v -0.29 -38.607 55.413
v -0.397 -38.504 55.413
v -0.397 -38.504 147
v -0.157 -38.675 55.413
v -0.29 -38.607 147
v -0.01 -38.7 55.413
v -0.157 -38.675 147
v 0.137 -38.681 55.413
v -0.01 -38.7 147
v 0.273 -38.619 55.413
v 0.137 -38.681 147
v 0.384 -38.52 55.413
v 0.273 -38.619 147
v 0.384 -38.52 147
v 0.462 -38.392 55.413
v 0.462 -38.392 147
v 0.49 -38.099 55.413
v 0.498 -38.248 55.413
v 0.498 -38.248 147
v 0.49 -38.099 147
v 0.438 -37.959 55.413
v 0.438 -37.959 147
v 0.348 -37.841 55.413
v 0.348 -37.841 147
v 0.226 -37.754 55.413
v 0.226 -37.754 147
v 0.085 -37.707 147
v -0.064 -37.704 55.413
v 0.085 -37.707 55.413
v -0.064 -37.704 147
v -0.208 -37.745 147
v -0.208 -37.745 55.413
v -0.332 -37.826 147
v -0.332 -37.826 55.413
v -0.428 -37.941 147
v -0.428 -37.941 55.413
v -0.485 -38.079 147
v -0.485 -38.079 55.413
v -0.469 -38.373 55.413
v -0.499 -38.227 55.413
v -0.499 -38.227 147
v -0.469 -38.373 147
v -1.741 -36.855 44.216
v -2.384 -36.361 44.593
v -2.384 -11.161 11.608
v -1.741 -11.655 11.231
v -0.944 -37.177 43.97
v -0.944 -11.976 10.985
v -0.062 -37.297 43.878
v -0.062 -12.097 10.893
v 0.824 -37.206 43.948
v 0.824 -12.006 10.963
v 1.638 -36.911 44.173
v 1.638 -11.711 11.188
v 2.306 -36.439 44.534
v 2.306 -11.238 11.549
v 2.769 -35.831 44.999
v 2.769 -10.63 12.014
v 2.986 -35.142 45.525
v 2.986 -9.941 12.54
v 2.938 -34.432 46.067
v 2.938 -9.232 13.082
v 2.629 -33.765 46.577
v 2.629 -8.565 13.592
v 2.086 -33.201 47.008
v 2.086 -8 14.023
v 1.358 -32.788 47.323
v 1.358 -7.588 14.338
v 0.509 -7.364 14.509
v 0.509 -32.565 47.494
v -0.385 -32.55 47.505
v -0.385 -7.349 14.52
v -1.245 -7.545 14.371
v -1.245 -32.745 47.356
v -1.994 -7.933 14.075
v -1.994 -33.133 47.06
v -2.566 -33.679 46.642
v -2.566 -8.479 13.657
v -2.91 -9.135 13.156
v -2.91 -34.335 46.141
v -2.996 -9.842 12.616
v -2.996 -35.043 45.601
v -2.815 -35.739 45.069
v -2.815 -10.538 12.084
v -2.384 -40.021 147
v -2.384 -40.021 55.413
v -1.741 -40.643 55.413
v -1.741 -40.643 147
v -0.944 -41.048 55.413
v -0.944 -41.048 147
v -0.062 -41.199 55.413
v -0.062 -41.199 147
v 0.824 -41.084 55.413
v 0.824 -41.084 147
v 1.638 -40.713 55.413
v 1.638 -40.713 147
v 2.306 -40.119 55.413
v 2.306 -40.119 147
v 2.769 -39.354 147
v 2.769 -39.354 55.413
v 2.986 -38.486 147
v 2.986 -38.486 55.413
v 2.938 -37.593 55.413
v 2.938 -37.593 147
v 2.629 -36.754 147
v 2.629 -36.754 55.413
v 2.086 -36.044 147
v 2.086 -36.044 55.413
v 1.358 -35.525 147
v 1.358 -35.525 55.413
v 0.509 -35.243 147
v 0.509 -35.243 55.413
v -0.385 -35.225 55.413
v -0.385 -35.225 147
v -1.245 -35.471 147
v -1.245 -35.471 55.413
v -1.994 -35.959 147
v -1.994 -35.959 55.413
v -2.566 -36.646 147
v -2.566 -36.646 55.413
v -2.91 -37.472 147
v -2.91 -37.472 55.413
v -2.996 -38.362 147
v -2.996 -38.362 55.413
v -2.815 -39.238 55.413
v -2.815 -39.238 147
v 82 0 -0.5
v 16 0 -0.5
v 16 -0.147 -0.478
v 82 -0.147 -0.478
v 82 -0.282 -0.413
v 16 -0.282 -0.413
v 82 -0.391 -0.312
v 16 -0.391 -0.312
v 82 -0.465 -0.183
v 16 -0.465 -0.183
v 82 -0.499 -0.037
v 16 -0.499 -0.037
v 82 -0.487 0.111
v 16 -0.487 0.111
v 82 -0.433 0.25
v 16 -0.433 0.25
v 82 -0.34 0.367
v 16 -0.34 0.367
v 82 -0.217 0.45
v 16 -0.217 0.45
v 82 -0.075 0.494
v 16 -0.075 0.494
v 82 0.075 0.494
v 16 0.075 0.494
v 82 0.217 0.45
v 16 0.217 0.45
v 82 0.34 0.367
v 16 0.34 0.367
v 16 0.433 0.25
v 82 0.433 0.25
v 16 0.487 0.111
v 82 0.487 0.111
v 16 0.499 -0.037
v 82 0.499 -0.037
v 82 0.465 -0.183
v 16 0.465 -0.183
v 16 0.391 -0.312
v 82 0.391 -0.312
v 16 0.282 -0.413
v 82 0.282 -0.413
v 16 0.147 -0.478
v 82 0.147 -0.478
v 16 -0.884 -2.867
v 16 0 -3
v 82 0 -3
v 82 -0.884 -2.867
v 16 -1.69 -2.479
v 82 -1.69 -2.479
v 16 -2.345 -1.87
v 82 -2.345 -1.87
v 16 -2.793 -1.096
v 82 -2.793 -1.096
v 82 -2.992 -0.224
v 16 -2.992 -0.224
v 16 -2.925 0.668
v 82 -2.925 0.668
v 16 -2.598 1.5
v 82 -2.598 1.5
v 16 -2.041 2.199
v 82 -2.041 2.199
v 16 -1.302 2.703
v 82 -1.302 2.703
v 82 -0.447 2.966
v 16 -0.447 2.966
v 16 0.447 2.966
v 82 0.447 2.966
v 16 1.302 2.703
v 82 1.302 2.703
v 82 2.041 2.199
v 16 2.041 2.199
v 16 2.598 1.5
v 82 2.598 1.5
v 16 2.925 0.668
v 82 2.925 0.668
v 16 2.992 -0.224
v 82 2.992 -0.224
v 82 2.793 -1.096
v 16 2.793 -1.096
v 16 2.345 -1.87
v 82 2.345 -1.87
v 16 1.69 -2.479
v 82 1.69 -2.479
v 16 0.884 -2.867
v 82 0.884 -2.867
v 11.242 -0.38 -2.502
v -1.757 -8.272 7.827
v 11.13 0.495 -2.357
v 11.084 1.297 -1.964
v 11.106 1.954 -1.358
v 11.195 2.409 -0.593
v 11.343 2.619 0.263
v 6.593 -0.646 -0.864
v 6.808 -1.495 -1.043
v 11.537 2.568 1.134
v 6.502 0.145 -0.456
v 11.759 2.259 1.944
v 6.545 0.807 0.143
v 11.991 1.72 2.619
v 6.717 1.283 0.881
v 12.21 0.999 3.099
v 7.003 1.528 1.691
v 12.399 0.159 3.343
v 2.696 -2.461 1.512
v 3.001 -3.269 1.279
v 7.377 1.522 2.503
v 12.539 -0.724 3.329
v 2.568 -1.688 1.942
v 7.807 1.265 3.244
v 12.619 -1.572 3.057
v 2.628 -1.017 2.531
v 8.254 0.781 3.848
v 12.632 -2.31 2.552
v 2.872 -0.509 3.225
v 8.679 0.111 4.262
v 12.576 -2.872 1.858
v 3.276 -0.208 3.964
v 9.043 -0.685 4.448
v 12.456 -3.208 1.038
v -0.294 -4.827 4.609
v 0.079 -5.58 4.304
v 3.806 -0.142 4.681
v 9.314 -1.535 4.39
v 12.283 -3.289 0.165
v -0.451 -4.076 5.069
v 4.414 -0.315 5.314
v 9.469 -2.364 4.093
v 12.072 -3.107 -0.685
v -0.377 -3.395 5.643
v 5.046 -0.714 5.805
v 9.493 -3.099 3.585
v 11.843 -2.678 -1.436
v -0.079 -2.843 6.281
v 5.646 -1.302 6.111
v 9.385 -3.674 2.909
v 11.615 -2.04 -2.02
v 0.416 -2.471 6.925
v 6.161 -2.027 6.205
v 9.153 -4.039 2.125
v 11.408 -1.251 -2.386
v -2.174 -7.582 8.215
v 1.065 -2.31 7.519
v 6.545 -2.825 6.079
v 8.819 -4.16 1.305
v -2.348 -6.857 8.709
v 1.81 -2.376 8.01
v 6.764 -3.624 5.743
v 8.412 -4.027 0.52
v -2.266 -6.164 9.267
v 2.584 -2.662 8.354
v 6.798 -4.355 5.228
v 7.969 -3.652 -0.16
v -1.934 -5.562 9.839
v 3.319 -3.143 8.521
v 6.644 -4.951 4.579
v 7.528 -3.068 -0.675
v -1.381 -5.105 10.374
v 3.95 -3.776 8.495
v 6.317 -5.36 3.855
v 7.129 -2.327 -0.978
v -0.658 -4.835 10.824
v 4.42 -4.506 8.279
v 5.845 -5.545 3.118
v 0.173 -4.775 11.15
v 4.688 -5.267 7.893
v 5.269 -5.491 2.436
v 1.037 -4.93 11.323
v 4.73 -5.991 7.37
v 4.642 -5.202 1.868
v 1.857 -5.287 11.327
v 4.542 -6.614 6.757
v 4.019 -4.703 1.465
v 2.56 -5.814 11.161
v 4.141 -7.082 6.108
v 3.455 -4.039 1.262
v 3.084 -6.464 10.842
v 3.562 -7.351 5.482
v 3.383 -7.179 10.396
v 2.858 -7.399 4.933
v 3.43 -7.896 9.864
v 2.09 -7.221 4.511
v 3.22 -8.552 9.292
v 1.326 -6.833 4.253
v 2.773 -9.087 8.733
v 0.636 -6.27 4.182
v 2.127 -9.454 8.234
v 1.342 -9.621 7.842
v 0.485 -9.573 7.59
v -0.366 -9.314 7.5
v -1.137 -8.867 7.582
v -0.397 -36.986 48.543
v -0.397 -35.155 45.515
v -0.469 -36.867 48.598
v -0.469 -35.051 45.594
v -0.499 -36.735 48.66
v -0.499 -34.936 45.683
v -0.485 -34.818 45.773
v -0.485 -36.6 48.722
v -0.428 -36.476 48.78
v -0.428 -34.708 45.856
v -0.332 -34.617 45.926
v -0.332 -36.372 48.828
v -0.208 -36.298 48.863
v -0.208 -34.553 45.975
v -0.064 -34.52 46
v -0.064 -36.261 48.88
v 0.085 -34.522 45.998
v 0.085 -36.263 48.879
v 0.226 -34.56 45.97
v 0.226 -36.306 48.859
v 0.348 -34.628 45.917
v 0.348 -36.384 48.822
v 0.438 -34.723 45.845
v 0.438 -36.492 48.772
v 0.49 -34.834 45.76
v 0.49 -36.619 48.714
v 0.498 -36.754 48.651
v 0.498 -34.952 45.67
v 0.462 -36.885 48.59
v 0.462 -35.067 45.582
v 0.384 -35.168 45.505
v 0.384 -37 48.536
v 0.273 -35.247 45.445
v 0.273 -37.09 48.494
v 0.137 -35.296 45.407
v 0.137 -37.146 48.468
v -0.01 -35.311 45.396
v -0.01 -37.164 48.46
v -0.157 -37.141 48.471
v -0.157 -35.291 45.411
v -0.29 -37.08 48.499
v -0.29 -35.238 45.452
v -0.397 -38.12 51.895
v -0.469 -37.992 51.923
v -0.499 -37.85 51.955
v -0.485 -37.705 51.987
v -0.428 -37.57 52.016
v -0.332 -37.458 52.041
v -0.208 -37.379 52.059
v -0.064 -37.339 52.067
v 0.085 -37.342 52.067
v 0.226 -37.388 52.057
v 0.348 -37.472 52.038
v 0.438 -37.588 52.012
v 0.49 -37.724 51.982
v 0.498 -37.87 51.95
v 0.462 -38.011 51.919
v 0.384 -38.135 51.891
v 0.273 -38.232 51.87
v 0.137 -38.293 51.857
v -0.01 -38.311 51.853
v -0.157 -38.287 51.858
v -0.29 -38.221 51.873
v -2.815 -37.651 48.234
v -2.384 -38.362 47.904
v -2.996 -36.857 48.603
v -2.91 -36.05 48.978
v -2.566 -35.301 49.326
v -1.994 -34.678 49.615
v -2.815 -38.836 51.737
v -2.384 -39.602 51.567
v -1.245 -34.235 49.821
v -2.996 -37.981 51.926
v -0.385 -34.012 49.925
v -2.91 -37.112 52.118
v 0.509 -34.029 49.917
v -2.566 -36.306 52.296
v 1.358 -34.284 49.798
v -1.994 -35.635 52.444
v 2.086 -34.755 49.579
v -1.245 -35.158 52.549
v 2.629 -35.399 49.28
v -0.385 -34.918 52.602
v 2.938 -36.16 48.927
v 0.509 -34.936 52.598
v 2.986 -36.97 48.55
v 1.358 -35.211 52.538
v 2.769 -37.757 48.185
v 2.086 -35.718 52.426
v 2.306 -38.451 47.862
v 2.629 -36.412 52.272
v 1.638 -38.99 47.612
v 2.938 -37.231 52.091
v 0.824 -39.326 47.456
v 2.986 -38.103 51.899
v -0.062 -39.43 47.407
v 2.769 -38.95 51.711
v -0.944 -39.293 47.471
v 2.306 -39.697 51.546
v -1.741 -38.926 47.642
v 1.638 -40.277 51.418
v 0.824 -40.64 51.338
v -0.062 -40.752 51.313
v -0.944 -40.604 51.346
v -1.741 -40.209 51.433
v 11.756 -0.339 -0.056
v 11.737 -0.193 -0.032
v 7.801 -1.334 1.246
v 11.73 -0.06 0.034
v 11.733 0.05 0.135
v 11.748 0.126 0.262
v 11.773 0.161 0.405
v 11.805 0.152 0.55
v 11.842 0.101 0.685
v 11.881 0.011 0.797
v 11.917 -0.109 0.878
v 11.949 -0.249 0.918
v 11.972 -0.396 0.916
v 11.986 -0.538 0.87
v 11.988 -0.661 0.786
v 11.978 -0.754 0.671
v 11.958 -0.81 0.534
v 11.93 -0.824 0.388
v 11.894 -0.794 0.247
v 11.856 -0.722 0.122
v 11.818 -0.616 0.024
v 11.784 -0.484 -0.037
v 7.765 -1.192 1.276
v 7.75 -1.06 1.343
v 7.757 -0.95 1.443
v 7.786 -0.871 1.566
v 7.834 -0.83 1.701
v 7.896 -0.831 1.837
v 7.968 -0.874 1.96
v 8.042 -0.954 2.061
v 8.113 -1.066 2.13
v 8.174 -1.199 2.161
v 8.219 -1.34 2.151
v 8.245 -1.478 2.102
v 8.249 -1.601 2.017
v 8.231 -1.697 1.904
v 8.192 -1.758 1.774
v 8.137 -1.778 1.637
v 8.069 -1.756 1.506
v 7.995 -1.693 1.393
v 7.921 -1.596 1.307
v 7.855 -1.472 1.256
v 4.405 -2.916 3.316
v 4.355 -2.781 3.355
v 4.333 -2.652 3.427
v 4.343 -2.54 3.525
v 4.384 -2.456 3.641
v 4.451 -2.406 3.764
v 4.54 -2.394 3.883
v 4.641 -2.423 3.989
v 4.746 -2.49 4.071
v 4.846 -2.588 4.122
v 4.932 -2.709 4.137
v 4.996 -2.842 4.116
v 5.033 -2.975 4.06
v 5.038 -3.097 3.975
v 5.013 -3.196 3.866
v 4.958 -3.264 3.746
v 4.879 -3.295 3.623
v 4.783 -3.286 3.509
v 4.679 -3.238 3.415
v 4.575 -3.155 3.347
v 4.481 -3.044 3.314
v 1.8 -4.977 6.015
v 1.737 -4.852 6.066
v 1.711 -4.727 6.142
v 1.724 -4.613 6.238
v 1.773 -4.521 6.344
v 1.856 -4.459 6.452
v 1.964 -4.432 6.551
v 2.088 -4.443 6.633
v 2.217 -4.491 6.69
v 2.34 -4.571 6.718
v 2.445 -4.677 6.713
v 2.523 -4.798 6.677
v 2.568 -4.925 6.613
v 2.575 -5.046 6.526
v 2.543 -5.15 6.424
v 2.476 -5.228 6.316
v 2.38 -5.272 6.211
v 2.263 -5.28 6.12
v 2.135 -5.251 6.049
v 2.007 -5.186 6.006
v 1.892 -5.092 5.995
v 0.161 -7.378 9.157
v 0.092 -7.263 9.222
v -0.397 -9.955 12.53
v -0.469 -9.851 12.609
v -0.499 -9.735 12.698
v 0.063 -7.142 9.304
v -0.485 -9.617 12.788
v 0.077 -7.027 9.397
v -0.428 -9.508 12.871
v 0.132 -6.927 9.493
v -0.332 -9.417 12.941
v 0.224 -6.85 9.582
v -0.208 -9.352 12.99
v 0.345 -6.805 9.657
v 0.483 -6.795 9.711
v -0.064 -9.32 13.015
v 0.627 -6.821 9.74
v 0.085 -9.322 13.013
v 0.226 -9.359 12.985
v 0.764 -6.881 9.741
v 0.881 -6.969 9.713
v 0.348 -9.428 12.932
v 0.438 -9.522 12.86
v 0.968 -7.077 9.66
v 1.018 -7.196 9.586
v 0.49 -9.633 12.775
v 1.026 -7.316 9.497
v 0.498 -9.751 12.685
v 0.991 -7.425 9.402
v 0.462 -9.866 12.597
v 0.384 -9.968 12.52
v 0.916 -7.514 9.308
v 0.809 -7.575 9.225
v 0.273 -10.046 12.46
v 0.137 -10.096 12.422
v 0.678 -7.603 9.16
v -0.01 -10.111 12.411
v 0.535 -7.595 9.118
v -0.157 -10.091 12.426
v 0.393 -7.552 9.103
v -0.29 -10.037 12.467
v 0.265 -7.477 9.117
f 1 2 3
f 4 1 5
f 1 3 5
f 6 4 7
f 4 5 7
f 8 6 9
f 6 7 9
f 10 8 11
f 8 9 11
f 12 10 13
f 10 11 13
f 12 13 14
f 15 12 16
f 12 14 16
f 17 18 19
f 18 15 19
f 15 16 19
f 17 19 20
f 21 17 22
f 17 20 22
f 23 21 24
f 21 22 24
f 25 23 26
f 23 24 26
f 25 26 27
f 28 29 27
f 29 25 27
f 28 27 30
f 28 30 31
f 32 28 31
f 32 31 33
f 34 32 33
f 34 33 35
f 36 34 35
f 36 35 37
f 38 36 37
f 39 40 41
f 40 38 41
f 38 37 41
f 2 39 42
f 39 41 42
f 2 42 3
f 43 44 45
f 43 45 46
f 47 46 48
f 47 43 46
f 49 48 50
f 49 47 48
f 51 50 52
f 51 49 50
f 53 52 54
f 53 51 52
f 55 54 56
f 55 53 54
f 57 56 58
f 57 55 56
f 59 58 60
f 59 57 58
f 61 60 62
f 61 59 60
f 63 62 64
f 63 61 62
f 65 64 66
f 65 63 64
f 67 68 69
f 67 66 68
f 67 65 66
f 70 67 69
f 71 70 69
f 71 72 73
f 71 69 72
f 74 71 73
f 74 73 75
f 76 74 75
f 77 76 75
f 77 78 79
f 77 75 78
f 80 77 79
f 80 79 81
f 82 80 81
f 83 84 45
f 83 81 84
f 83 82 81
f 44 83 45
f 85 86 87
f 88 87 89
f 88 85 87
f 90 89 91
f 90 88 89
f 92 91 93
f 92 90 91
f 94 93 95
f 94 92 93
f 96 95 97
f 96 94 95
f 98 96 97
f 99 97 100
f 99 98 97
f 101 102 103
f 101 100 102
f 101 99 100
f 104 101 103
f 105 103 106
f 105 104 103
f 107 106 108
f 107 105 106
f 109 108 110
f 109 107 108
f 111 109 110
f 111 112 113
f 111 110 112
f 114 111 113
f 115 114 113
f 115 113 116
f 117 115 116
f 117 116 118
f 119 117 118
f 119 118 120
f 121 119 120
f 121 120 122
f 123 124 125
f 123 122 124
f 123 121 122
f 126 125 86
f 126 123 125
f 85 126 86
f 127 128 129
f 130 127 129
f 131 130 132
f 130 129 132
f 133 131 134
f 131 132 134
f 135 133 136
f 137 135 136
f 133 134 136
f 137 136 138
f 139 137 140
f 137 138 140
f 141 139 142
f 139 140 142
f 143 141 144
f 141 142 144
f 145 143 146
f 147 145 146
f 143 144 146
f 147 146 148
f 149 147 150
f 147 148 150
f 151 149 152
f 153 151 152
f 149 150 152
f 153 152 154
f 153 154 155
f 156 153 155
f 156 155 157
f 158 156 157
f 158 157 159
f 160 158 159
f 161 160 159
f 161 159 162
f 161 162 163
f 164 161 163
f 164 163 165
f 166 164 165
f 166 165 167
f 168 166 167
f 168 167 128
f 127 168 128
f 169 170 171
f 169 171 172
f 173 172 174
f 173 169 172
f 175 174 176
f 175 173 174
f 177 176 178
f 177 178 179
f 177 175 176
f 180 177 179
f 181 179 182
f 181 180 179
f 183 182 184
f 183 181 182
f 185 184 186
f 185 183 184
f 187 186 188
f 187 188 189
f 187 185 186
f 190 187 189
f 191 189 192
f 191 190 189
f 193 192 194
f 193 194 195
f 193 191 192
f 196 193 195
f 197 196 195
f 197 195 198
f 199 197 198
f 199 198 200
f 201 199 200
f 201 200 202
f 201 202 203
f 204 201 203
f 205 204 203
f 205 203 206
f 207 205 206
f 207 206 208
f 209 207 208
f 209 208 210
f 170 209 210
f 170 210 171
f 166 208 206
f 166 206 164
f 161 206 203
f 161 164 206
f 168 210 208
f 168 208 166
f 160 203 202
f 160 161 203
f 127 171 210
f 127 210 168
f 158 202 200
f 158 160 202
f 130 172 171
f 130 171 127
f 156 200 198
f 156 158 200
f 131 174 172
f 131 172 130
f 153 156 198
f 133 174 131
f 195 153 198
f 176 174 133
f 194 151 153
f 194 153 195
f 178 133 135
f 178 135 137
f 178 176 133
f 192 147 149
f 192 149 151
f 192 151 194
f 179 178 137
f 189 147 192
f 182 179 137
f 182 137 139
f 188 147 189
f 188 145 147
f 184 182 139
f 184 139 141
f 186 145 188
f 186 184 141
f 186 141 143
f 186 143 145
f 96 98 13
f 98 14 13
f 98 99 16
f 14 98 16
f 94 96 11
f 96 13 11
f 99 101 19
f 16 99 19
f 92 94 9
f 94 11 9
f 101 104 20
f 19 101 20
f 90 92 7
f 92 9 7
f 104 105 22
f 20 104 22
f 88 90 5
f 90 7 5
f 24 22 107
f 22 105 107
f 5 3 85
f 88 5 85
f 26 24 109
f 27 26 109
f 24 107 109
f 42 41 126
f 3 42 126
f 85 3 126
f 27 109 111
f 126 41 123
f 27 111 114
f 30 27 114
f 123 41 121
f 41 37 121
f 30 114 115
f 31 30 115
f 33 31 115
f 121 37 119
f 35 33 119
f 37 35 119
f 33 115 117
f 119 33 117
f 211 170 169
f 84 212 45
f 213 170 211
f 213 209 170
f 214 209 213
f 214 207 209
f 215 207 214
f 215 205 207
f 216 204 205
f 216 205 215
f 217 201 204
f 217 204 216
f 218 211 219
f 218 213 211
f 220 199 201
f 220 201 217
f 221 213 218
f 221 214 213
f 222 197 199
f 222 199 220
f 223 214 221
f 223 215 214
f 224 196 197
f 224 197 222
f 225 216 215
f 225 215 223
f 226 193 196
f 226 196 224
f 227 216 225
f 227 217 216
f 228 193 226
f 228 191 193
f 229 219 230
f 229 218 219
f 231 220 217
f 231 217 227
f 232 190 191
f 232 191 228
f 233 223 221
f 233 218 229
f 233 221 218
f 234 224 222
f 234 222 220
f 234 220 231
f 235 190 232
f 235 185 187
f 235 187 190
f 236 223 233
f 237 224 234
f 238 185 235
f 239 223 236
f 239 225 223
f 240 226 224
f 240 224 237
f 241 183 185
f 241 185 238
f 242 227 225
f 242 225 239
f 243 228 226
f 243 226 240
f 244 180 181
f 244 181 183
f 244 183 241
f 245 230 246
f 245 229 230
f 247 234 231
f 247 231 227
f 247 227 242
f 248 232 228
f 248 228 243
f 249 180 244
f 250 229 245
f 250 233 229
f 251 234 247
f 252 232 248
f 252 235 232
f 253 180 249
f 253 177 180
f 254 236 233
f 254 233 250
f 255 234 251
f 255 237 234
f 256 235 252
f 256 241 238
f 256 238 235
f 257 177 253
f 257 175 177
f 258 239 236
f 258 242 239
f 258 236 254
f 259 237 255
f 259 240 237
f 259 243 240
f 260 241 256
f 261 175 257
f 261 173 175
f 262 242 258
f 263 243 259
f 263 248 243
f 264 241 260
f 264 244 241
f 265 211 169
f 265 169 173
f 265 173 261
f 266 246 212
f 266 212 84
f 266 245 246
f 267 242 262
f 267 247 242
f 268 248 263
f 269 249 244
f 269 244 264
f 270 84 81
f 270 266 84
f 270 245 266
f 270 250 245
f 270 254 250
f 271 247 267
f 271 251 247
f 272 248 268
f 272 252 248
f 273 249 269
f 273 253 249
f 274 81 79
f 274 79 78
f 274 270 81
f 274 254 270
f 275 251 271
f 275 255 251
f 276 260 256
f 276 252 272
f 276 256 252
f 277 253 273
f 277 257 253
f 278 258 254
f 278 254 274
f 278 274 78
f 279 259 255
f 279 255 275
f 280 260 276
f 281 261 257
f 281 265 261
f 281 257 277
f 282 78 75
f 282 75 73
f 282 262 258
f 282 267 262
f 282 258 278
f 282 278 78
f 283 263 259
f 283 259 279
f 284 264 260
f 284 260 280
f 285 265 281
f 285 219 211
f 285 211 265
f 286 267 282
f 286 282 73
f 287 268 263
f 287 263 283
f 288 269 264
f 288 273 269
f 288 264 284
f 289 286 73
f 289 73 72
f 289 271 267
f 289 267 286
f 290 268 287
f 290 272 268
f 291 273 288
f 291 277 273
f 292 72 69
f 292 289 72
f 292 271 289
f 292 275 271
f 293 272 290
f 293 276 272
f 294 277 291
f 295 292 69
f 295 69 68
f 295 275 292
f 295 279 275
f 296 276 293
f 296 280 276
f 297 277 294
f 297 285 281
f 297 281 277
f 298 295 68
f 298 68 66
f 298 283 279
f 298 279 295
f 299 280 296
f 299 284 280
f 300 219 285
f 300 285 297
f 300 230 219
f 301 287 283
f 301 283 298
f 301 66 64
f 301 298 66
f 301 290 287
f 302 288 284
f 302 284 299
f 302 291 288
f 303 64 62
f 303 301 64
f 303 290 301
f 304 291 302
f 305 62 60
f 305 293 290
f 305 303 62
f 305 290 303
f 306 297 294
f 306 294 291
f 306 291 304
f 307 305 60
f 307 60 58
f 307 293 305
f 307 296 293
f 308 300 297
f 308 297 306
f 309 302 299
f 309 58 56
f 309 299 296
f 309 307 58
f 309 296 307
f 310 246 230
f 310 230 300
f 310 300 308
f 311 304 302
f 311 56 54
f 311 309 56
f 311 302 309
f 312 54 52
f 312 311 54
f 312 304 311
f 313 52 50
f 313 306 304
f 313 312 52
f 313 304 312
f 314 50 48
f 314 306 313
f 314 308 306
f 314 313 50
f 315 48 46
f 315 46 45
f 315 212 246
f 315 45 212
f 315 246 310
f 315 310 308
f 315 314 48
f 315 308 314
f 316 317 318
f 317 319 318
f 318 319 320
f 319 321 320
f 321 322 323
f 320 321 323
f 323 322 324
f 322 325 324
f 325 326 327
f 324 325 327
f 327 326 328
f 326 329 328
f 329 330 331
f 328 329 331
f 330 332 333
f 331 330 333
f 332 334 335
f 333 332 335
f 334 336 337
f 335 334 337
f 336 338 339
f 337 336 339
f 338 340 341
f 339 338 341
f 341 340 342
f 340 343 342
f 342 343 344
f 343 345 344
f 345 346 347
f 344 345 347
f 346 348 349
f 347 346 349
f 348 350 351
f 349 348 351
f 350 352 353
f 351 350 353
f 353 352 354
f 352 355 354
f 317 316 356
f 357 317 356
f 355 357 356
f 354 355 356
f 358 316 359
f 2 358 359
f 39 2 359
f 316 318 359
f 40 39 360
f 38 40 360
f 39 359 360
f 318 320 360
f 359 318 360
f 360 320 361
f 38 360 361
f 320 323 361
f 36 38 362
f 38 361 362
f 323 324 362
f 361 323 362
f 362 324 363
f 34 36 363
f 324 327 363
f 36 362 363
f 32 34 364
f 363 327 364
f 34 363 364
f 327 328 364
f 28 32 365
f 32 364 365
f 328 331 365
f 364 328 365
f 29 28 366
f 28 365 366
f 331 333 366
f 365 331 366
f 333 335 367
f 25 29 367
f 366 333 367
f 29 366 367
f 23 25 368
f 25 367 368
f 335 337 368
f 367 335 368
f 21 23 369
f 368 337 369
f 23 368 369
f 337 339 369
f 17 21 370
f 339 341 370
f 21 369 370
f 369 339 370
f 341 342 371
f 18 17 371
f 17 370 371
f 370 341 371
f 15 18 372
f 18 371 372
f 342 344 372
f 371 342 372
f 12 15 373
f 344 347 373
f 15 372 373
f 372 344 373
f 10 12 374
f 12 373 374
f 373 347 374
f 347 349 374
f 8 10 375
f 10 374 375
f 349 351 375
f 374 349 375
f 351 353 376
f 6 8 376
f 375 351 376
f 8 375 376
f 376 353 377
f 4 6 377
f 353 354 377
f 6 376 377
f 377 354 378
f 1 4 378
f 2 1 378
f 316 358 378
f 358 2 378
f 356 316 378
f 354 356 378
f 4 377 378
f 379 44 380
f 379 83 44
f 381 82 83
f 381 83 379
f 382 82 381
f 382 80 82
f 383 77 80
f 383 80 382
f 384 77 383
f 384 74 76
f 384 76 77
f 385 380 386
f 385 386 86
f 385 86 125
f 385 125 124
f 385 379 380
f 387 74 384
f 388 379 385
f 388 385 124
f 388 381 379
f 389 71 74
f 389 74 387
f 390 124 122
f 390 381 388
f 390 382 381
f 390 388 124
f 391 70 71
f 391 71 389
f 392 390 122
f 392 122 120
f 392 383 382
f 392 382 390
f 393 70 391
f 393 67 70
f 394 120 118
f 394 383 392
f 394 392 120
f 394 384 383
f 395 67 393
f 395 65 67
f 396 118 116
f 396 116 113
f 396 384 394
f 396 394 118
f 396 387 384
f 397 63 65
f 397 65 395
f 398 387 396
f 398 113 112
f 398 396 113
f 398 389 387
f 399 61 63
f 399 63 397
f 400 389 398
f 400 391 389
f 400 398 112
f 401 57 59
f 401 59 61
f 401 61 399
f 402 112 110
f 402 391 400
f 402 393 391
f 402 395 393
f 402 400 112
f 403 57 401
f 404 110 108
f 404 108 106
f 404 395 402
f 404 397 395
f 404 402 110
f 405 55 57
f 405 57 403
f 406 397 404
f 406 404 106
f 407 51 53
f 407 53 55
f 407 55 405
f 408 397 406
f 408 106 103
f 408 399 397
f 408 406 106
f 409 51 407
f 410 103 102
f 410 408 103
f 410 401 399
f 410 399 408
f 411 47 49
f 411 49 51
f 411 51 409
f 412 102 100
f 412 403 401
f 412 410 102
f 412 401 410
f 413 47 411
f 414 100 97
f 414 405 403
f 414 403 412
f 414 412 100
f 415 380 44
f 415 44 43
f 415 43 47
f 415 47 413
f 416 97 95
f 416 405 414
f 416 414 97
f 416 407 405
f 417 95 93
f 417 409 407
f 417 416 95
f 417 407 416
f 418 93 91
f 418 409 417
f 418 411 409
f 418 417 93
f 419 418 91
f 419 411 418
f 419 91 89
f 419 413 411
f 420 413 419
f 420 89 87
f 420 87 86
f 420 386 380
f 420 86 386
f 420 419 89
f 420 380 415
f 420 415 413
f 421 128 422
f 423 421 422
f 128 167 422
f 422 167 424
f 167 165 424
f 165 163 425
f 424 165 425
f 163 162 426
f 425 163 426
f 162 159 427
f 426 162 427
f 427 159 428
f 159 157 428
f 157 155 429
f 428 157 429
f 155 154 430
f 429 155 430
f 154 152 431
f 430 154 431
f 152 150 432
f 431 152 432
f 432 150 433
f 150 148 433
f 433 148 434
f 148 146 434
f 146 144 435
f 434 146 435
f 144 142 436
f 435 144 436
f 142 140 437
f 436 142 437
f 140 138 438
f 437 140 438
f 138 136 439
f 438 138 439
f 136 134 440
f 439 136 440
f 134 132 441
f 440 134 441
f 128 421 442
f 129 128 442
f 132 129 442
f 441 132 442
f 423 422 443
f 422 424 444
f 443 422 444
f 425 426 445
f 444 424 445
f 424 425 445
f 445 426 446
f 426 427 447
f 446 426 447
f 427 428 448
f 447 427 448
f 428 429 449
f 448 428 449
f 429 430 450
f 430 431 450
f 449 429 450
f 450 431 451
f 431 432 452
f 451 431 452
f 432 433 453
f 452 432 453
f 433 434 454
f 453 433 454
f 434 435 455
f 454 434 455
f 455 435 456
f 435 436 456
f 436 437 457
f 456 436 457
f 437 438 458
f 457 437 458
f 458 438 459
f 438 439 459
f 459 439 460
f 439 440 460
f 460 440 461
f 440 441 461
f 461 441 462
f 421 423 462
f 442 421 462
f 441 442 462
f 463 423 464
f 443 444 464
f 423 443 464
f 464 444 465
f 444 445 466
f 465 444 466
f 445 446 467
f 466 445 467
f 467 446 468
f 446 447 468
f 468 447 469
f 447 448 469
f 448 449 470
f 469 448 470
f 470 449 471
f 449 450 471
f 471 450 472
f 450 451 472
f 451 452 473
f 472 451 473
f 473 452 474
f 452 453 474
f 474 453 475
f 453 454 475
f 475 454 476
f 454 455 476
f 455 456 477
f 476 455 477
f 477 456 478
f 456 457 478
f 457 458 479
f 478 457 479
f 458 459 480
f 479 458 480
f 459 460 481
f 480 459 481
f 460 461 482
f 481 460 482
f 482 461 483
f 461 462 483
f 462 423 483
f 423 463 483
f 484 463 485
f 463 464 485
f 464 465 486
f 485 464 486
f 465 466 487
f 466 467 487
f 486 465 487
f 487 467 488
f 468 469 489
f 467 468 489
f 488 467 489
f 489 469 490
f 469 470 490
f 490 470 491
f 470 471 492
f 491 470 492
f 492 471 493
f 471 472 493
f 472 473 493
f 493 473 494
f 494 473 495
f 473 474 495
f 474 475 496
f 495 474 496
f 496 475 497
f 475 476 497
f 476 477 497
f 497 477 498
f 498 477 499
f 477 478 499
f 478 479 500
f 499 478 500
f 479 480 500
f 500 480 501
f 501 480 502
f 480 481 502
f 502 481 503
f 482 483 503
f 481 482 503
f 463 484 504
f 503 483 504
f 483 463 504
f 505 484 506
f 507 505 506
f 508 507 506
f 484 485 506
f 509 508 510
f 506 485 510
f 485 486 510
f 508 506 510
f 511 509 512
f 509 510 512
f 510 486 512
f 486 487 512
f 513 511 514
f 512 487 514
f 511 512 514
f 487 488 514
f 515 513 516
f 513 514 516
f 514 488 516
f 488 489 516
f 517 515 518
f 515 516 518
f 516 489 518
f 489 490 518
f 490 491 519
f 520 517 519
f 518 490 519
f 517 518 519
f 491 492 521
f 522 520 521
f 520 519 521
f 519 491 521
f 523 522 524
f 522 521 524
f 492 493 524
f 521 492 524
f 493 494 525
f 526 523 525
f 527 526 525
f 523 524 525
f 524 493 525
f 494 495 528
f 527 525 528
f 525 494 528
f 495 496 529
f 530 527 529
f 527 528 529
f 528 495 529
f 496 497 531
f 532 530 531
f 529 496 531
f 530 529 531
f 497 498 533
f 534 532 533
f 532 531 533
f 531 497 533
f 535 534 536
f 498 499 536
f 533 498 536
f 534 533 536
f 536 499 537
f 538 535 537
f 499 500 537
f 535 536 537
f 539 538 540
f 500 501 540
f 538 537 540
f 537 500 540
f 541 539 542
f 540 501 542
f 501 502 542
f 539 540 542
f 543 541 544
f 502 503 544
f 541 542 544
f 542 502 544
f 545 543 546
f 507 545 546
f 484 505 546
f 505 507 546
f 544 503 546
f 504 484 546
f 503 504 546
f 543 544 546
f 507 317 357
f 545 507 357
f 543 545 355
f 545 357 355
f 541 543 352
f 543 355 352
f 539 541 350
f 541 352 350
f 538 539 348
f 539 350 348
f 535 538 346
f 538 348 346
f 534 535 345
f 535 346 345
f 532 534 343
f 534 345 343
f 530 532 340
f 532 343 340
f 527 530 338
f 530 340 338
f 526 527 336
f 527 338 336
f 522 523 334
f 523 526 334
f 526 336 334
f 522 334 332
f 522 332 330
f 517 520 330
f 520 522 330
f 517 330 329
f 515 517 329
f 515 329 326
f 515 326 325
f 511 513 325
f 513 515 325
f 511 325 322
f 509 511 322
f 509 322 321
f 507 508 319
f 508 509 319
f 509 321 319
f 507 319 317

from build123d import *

# Parameters (mm, degrees)
SKICA4_R   = 3
SKICA4_R_2 = 0.5


with BuildPart() as part:
    # Táhnout po křivce1: sweep along a curve in space
    with BuildLine() as t_hnout_po_k_ivce1_path:
        Line((82, 0, 0), (16, 0, 0))
        ThreePointArc((16, 0, 0), (4.686291501, -2.845029331, 3.723860381), (0, -9.713537728, 12.714054617))
        Line((0, -9.713537728, 12.714054617), (0, -34.914054617, 45.699024368))
        ThreePointArc((0, -34.914054617, 45.699024368), (0, -37.35626725, 50.285422244), (0, -38.2, 55.412562096))
        Line((0, -38.2, 55.412562096), (0, -38.2, 147))
    # Skica4 → Táhnout po křivce1 (sweep)
    with BuildSketch(Plane(origin=(82, 0, 0), x_dir=(0, 0, -1), z_dir=(1, 0, 0))):
        Circle(SKICA4_R)
        Circle(SKICA4_R_2, mode=Mode.SUBTRACT)
    sweep(path=t_hnout_po_k_ivce1_path.line)


solid = part.part
